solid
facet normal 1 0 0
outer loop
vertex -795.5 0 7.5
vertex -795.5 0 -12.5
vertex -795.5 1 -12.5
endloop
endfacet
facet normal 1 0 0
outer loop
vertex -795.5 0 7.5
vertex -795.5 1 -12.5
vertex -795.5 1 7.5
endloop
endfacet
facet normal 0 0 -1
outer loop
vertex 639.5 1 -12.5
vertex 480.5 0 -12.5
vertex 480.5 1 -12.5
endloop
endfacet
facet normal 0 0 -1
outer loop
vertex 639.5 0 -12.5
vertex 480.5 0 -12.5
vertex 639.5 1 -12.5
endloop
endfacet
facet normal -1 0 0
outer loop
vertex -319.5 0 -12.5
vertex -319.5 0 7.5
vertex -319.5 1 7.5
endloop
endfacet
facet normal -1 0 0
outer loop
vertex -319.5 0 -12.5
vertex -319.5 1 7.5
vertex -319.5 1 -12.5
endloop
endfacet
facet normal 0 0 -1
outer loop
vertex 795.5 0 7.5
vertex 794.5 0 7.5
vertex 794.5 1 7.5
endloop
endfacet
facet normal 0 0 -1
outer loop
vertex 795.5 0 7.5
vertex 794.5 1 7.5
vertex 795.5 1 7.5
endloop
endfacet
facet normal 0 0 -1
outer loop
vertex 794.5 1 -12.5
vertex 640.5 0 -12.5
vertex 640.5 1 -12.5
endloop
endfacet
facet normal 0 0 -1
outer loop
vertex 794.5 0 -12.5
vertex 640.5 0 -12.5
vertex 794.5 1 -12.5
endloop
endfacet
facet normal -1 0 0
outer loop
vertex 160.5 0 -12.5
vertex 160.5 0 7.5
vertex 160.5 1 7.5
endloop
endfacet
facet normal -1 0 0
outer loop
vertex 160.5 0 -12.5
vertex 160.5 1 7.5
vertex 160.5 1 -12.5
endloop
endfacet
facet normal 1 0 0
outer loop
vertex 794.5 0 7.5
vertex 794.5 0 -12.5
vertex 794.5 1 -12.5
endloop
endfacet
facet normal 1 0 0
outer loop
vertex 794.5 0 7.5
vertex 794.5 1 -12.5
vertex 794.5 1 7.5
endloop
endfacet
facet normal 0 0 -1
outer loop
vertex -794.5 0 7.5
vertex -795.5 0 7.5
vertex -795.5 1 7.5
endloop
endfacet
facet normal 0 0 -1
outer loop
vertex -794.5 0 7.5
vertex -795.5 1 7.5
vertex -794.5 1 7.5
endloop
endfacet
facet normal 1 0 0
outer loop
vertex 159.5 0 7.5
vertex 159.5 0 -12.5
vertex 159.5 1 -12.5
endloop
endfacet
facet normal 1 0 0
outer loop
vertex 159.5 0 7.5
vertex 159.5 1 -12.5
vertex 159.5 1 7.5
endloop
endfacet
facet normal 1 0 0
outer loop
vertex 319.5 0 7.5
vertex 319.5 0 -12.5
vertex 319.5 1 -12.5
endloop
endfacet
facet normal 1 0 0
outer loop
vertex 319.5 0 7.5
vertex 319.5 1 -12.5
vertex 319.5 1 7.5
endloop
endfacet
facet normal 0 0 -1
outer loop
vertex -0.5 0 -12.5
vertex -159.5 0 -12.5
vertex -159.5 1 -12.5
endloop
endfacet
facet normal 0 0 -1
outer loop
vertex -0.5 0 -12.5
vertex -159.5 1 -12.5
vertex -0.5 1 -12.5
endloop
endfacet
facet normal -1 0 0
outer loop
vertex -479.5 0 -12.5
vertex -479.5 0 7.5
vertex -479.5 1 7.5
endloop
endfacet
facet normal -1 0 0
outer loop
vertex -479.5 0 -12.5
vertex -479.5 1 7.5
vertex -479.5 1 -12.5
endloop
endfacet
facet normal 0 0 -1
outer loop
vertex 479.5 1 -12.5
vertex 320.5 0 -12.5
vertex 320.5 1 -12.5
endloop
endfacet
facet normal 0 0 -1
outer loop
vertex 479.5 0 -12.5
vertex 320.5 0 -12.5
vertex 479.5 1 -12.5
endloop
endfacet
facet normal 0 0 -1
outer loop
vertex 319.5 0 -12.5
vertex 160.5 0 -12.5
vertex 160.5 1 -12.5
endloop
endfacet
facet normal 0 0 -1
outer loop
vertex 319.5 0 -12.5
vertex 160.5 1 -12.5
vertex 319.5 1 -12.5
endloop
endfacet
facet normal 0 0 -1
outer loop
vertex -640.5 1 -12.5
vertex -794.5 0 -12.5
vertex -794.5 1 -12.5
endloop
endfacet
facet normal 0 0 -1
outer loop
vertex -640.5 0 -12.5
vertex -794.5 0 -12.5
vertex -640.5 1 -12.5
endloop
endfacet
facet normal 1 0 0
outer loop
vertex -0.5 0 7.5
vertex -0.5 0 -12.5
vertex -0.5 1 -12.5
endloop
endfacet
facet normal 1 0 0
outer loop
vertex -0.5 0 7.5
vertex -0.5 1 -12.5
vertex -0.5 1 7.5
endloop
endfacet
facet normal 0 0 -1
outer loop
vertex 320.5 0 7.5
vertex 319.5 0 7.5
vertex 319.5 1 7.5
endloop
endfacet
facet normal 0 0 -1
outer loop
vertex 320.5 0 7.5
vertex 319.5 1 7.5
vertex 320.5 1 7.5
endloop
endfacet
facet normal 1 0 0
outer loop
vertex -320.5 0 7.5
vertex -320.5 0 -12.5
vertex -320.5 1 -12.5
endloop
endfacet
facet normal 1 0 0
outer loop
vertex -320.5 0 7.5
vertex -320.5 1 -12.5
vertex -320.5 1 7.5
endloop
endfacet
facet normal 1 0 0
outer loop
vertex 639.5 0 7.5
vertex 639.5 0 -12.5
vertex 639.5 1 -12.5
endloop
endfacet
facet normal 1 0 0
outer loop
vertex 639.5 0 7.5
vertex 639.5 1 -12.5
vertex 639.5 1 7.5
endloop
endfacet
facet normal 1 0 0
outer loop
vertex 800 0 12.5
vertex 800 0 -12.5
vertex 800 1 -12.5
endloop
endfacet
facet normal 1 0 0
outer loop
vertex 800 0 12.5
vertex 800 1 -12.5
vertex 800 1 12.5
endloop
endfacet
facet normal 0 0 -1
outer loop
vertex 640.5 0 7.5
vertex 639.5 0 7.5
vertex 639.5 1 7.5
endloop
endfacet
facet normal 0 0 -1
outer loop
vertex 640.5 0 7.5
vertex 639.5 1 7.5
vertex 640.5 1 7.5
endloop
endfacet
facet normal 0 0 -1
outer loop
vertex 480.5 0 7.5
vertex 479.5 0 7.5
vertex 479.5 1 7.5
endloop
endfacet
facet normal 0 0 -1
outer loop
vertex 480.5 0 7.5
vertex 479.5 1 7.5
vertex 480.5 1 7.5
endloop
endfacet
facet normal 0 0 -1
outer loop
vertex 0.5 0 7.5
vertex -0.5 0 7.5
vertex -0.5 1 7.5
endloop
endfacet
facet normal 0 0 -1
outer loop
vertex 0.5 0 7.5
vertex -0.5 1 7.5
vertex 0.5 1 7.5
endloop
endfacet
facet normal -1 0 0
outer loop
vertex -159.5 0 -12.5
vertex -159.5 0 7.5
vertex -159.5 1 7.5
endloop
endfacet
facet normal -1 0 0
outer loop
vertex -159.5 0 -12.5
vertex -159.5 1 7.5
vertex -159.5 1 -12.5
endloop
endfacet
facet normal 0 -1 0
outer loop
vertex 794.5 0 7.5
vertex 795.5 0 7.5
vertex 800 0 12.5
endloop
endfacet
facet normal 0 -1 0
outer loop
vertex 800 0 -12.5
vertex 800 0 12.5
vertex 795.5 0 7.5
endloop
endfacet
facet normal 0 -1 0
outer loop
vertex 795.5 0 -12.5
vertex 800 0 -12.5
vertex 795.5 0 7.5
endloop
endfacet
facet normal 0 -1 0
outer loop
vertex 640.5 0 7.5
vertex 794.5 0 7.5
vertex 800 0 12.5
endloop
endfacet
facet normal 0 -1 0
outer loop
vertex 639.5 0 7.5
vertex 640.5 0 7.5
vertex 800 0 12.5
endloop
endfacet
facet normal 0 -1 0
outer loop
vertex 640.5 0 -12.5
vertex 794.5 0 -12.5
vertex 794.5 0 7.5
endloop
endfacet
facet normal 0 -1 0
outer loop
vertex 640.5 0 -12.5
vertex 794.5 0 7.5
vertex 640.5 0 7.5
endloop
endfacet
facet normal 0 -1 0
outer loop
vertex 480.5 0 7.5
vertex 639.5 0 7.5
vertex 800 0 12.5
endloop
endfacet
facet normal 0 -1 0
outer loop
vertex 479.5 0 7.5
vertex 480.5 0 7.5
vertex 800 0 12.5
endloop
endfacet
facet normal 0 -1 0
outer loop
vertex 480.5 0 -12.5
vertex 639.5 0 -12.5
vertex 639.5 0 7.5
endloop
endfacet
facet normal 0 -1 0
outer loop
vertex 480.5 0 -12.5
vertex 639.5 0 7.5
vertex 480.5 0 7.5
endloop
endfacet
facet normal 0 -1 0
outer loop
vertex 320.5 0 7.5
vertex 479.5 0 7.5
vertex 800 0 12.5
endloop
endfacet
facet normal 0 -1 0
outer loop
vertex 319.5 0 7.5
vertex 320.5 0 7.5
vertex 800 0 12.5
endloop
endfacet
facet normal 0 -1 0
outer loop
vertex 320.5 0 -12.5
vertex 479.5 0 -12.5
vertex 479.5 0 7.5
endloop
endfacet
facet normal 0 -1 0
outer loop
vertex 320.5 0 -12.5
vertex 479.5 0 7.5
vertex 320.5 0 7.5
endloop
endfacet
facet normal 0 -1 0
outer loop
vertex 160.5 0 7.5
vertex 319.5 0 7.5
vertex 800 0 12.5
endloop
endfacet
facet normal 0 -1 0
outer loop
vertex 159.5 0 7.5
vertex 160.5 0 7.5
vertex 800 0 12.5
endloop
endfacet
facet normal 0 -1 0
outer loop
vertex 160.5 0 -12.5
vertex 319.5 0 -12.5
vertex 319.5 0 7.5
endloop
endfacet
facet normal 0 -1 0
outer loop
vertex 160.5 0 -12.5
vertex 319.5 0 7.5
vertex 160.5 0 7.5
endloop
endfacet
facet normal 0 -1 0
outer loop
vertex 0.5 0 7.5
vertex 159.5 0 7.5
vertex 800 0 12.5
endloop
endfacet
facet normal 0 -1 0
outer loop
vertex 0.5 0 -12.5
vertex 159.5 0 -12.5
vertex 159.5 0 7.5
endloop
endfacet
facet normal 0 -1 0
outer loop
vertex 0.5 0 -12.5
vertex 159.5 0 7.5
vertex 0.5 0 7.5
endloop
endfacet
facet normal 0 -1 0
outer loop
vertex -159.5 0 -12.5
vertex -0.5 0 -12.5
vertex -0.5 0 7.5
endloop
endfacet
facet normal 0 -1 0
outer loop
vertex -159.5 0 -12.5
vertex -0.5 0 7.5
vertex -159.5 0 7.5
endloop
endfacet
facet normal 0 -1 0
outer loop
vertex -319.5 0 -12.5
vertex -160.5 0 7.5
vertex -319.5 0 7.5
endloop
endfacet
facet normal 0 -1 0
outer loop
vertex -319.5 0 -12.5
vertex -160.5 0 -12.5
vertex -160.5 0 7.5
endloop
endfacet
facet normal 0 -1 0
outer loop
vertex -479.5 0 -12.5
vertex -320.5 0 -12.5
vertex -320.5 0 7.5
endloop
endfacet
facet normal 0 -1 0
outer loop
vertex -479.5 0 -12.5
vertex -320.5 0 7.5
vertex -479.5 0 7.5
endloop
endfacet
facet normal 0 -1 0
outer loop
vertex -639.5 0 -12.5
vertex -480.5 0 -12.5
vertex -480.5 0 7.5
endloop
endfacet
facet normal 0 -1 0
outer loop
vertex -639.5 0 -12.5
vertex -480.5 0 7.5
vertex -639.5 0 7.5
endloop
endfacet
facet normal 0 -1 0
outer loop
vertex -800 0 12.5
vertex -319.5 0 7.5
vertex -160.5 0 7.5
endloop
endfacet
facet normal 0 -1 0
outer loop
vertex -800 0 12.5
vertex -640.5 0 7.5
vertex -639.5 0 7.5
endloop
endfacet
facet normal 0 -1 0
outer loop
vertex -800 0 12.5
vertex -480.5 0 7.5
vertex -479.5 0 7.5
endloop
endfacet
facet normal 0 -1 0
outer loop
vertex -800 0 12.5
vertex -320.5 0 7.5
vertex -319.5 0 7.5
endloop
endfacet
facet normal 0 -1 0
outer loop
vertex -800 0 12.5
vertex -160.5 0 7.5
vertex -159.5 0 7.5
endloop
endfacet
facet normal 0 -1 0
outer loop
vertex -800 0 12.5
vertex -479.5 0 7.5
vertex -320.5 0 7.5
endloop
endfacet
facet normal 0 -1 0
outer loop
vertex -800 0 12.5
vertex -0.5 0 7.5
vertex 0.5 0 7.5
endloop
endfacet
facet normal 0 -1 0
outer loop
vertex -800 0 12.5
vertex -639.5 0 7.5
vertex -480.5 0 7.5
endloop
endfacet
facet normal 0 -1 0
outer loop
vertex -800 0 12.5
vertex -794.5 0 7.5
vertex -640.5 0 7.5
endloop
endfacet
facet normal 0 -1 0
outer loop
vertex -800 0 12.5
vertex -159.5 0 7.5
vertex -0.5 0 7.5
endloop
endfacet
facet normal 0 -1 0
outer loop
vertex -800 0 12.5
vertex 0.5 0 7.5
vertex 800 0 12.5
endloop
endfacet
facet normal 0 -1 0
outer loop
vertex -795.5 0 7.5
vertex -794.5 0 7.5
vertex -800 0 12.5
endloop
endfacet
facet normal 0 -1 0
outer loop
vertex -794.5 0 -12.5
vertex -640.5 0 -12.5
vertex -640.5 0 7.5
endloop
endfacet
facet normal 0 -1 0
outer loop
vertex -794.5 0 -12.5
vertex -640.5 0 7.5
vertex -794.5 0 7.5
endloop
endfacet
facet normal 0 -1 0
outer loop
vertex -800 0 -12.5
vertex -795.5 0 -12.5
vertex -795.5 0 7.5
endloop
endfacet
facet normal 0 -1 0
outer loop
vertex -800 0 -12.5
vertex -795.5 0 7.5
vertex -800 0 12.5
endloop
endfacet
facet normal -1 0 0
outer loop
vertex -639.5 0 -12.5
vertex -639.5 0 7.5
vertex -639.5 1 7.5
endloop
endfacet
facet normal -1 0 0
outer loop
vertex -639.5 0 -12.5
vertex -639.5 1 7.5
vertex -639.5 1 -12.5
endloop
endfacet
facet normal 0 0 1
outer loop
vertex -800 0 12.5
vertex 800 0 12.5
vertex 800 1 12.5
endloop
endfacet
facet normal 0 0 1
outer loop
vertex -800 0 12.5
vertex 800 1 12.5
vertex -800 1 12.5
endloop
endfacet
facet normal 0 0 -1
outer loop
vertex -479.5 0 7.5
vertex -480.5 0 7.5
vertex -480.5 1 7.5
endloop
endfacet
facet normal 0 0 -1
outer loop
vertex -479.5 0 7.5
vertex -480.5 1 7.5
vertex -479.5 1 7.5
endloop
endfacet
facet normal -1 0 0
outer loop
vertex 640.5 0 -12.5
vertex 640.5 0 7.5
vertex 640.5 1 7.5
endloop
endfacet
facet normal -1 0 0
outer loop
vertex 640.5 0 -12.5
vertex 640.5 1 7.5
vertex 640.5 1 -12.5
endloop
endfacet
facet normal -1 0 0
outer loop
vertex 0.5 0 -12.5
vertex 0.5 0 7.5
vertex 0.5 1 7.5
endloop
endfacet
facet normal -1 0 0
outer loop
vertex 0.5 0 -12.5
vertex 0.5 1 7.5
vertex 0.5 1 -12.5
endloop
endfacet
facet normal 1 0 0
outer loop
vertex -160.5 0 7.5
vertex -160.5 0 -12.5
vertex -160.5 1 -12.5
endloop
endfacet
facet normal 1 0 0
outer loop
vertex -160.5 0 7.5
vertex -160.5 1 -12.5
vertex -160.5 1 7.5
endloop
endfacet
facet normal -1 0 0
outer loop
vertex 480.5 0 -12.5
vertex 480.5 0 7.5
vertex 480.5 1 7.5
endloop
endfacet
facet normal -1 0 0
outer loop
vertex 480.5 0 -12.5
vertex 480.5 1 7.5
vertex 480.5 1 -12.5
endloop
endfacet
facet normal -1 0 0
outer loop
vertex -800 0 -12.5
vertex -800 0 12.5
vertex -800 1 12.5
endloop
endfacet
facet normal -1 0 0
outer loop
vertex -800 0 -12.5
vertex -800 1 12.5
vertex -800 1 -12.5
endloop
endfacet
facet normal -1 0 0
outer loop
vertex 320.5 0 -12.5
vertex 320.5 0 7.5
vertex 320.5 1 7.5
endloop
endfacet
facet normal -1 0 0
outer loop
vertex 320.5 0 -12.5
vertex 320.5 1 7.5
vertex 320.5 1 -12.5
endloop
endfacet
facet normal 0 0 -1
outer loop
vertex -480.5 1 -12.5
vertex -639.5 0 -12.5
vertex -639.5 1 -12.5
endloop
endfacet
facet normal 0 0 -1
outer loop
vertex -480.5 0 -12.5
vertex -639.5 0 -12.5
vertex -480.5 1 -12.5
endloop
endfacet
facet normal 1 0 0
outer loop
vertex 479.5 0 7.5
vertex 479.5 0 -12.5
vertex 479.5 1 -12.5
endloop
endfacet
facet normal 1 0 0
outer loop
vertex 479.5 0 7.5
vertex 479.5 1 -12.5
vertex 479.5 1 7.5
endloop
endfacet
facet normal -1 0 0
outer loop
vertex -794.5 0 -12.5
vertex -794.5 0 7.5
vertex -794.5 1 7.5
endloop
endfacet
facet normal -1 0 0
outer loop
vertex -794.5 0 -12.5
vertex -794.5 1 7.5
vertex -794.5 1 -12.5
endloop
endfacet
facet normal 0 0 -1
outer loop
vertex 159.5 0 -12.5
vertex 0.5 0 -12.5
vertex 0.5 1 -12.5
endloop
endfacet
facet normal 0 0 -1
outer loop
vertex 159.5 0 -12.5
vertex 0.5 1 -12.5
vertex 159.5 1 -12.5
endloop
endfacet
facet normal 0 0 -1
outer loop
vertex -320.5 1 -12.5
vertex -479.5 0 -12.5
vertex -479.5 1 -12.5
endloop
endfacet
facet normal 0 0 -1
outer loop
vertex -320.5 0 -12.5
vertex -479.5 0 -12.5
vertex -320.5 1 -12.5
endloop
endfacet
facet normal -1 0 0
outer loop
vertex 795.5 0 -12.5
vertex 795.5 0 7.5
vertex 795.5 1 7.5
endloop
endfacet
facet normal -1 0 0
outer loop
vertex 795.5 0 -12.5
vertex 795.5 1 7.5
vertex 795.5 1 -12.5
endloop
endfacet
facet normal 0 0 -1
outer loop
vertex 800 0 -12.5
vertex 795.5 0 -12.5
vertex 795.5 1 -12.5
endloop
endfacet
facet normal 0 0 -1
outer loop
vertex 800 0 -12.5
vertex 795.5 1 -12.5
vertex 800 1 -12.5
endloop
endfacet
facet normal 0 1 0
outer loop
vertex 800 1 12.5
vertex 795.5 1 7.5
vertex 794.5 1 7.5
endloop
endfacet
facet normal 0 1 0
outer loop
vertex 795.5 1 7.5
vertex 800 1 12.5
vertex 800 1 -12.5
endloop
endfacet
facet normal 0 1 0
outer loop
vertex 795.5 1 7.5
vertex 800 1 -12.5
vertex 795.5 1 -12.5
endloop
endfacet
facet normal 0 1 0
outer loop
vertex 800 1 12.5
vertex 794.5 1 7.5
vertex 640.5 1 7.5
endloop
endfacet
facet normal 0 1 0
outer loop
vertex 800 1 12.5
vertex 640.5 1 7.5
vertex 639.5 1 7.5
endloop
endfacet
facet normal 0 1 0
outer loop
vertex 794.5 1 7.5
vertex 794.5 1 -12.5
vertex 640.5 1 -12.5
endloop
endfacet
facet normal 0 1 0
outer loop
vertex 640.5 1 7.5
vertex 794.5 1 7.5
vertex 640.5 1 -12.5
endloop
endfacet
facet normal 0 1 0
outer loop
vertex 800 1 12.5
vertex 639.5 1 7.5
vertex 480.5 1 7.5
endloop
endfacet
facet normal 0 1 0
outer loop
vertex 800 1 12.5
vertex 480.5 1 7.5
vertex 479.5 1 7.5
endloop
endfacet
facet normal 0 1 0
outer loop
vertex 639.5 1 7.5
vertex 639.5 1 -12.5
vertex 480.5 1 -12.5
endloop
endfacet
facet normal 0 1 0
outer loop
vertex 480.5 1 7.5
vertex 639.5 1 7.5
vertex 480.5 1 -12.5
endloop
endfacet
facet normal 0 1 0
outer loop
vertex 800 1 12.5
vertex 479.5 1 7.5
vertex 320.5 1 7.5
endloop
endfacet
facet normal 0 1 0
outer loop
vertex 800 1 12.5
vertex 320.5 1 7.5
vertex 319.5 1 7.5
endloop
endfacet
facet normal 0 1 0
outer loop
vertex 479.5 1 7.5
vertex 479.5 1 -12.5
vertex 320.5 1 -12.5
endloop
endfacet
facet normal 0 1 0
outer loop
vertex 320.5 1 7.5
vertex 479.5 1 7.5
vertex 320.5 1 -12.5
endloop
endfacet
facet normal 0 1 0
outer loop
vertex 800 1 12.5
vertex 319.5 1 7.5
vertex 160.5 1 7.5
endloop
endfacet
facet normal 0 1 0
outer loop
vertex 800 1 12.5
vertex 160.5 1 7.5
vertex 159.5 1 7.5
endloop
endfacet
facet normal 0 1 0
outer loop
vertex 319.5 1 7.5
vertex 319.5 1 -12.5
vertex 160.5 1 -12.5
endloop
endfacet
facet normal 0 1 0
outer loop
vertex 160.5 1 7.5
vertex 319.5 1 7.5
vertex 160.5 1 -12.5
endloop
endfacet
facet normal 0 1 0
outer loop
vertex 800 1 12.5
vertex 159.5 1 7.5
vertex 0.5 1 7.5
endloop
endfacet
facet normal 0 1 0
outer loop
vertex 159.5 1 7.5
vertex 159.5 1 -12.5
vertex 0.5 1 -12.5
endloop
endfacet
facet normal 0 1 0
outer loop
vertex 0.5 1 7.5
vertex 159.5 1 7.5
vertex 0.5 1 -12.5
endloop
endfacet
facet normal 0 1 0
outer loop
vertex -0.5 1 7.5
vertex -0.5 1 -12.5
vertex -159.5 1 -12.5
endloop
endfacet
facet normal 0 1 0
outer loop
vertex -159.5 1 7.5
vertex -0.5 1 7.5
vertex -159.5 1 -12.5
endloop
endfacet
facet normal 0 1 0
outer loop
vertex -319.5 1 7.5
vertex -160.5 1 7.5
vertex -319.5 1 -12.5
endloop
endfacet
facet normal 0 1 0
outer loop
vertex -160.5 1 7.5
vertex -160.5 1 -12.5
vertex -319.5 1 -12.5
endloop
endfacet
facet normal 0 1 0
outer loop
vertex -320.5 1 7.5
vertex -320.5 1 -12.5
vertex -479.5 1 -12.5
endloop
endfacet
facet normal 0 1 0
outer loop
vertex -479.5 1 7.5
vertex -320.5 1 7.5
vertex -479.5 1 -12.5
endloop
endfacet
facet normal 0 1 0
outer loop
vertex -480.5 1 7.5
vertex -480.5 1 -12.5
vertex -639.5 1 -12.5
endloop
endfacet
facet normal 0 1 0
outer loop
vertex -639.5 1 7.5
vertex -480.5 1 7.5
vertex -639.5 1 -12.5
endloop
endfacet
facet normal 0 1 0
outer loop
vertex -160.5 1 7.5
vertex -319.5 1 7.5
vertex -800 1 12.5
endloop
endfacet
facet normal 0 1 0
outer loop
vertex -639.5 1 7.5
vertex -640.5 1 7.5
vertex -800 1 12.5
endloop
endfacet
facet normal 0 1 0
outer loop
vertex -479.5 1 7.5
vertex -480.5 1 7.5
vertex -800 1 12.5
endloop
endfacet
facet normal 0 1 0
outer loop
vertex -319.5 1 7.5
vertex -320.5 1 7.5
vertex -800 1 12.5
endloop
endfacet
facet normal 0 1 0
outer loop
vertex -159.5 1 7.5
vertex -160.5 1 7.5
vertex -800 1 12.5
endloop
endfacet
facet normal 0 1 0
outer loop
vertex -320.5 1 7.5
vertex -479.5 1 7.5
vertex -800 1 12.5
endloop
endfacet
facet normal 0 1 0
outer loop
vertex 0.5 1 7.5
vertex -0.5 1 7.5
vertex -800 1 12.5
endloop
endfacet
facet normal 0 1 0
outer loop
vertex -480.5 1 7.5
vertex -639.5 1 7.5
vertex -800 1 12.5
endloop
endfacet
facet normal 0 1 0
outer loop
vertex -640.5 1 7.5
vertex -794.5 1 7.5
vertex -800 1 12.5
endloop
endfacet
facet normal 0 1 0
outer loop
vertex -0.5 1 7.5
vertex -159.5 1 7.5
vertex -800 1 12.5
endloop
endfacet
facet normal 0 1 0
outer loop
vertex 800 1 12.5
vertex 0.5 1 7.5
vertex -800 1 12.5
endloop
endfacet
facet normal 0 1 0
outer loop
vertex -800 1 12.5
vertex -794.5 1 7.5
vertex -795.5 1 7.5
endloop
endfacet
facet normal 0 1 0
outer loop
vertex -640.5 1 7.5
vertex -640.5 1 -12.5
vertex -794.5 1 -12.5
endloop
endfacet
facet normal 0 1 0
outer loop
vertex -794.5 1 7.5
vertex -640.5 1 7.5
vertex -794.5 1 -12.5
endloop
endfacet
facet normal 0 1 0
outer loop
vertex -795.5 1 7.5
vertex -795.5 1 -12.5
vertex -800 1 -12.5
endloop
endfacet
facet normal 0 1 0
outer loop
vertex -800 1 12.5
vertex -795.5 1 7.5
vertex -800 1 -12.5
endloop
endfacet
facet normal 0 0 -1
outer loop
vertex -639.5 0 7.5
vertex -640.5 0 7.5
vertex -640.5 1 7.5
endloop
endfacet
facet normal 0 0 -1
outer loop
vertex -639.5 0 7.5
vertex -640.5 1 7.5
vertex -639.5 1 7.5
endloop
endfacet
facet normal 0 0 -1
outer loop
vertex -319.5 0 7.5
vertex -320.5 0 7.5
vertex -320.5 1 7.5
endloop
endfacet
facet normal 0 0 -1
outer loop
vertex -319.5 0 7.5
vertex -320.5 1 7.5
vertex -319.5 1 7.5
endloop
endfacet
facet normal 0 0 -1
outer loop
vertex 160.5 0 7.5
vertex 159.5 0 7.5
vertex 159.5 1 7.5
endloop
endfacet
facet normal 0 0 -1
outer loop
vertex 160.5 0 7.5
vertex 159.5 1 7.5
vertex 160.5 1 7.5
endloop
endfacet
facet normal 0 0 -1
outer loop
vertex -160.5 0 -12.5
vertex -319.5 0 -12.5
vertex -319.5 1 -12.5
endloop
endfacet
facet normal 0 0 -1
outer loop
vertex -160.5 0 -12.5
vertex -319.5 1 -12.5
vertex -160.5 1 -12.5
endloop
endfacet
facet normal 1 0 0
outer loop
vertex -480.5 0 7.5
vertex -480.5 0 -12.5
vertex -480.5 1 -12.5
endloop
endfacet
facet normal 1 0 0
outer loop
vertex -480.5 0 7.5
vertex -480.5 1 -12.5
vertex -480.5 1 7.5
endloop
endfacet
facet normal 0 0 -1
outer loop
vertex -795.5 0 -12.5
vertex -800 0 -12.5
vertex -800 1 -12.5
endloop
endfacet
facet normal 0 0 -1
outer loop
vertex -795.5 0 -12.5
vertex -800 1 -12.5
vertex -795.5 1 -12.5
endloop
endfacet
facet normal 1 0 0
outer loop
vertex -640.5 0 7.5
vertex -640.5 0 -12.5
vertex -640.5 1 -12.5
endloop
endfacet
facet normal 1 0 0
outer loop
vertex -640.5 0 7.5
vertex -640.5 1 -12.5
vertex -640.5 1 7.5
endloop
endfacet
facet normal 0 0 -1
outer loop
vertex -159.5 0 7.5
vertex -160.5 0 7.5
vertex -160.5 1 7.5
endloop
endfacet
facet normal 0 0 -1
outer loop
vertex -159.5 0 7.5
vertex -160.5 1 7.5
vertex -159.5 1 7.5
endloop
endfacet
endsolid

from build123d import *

# Parameters (mm, degrees)
BOSS_EXTRUDE1_DEPTH = 1


with BuildPart() as part:
    # Sketch2 → Boss-Extrude1 (new body)
    with BuildSketch(Plane(origin=(0, 0, 0), x_dir=(1, 0, 0), z_dir=(0, 1, 0))):
        Polygon((-800, -12.5), (-800, 12.5), (-795.5, 12.5), (-795.5, -7.5), (-794.5, -7.5), (-794.5, 12.5), (-640.5, 12.5), (-640.5, -7.5), (-639.5, -7.5), (-639.5, 12.5), (-480.5, 12.5), (-480.5, -7.5), (-479.5, -7.5), (-479.5, 12.5), (-320.5, 12.5), (-320.5, -7.5), (-319.5, -7.5), (-319.5, 12.5), (-160.5, 12.5), (-160.5, -7.5), (-159.5, -7.5), (-159.5, 12.5), (-0.5, 12.5), (-0.5, -7.5), (0.5, -7.5), (0.5, 12.5), (159.5, 12.5), (159.5, -7.5), (160.5, -7.5), (160.5, 12.5), (319.5, 12.5), (319.5, -7.5), (320.5, -7.5), (320.5, 12.5), (479.5, 12.5), (479.5, -7.5), (480.5, -7.5), (480.5, 12.5), (639.5, 12.5), (639.5, -7.5), (640.5, -7.5), (640.5, 12.5), (794.5, 12.5), (794.5, -7.5), (795.5, -7.5), (795.5, 12.5), (800, 12.5), (800, -12.5), align=None)
    extrude(amount=BOSS_EXTRUDE1_DEPTH)


solid = part.part
